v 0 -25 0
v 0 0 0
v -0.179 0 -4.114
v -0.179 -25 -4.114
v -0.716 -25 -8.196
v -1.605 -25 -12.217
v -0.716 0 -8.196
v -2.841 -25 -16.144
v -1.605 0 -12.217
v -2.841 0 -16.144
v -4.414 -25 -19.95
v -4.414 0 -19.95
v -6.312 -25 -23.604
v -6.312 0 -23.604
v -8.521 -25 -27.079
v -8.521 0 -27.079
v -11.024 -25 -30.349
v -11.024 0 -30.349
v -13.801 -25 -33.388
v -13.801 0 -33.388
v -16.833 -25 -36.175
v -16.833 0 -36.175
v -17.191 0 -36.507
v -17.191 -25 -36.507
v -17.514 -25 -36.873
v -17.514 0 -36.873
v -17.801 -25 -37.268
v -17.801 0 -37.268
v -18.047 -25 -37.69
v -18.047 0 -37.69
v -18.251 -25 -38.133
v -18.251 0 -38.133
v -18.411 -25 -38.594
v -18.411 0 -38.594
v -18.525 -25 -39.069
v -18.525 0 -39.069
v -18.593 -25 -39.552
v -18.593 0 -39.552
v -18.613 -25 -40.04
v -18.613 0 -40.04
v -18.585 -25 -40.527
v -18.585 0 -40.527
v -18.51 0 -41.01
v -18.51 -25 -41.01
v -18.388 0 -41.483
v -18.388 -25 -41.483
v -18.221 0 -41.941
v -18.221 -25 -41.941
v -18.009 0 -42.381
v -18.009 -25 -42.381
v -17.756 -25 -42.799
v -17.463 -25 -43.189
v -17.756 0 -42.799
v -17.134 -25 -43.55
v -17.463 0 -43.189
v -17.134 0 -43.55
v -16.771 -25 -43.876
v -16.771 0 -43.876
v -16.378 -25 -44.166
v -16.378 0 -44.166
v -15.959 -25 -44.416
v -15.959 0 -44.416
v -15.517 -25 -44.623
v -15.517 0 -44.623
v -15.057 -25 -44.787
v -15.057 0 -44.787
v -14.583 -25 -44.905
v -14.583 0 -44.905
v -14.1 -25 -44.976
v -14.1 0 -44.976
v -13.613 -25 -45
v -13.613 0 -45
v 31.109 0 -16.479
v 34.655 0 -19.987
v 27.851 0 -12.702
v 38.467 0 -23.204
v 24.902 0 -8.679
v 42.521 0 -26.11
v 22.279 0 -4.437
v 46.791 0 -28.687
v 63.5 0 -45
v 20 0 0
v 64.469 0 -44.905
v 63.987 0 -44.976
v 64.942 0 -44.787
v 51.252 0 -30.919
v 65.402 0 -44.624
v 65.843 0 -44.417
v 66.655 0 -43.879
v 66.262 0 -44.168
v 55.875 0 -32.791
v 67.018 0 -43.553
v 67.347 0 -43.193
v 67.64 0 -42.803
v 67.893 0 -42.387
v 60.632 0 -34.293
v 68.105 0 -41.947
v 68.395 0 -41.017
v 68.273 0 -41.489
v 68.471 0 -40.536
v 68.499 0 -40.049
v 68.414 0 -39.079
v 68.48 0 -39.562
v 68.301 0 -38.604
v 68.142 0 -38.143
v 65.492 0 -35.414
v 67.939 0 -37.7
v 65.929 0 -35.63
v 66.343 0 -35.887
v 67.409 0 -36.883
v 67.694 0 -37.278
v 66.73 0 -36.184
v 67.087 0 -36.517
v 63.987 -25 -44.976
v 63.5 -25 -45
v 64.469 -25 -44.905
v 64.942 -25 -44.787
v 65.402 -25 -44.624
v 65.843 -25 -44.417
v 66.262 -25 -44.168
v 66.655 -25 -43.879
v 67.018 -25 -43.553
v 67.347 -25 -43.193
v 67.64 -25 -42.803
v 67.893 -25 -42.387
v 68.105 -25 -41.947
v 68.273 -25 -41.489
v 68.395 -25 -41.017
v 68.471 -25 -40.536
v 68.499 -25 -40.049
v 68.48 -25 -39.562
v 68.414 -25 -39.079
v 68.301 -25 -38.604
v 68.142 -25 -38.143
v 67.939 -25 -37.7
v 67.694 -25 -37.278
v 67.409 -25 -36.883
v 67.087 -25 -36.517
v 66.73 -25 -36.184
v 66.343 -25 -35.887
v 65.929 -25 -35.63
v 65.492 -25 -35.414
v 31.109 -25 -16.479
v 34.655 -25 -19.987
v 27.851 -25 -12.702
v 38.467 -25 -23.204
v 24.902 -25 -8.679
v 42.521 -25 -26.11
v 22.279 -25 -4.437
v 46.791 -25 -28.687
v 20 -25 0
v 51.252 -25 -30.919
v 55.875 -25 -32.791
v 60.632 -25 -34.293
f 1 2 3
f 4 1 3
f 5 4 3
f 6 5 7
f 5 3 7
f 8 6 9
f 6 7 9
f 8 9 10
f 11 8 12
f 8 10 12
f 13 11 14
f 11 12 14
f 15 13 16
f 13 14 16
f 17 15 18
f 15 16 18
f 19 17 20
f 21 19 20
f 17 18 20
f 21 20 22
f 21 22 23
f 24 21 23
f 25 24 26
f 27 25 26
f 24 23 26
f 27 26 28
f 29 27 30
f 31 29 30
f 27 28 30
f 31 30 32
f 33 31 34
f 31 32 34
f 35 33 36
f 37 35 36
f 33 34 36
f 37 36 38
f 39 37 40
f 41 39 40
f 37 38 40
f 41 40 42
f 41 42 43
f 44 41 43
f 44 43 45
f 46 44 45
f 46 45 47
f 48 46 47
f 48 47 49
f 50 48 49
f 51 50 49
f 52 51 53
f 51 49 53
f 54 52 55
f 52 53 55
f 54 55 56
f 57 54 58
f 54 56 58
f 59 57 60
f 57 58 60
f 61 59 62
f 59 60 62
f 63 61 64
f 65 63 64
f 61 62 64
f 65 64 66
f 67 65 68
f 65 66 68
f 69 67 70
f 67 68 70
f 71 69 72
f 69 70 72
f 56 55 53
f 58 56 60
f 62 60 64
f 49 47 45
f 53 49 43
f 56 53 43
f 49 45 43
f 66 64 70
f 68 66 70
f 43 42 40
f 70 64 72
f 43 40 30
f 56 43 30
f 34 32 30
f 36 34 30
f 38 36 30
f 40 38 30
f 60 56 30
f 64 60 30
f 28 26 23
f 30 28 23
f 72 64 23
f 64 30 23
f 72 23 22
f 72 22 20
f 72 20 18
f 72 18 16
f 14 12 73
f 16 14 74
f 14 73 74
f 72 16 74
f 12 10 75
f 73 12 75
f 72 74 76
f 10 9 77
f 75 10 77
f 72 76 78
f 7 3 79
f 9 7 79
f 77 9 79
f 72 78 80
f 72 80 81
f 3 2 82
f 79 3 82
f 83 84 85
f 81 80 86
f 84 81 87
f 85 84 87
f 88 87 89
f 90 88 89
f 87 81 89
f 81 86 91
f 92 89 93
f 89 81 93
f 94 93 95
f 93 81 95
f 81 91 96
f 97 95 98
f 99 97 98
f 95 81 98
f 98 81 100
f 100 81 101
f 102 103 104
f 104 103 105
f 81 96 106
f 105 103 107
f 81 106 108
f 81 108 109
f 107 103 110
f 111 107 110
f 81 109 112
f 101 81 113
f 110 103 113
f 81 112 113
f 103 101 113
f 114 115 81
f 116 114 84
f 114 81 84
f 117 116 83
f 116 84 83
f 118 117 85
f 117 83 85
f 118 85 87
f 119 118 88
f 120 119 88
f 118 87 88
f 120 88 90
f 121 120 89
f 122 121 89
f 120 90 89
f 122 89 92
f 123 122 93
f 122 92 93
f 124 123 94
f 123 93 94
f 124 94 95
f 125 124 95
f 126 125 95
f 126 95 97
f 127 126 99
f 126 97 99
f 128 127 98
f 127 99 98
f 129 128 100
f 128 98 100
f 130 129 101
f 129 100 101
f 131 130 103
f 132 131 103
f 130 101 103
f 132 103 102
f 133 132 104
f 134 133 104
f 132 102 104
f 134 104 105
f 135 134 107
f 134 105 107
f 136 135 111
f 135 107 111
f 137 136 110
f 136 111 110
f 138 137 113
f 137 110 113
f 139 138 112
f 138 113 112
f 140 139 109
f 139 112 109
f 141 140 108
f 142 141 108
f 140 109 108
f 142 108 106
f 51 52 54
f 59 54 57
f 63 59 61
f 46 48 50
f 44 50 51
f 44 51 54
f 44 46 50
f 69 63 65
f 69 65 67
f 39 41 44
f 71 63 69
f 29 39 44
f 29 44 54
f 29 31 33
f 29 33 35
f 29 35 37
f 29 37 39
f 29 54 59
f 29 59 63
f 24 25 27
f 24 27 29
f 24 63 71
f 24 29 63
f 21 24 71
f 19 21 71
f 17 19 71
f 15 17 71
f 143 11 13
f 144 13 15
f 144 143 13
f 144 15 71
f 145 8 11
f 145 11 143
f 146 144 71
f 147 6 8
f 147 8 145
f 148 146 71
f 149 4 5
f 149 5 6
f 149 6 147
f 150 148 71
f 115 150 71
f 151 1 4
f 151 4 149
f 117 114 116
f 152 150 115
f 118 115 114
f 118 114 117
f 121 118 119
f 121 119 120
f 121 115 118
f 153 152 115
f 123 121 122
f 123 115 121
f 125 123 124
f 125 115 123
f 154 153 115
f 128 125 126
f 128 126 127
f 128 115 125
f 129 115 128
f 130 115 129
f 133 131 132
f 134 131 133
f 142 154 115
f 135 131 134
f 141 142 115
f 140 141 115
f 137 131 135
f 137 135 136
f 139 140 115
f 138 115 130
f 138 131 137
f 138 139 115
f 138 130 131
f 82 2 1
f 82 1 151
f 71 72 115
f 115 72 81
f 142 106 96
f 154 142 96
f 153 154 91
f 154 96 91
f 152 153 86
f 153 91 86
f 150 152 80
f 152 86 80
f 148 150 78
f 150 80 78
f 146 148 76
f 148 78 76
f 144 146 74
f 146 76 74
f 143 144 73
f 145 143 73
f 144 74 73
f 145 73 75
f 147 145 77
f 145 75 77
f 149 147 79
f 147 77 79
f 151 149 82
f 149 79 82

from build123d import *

# Parameters (mm, degrees)
F0_W     = 20
F0_H     = 45
F1_DEPTH = 25


with BuildPart() as f1:
    # F0 (on Front) → F1 (new body)
    with BuildSketch(Plane.XZ):
        with BuildLine():
            Line((0, -45), (0, 0))
            ThreePointArc((0, 0), (-4.414268, -19.949802), (-16.832935, -36.175002))
            ThreePointArc((-16.832935, -36.175002), (-18.309855, -41.713915), (-13.612782, -45))
            Line((-13.612782, -45), (0, -45))
        make_face()
        with Locations((10, -22.5)):
            Rectangle(F0_W, F0_H)
        with BuildLine():
            ThreePointArc((65.491798, -35.414037), (38.466638, -23.204028), (20, 0))
            Line((20, 0), (20, -45))
            Line((20, -45), (63.499577, -45))
            ThreePointArc((63.499577, -45), (68.394974, -41.017395), (65.491798, -35.414037))
        make_face()
    extrude(amount=F1_DEPTH)


solid = f1.part
